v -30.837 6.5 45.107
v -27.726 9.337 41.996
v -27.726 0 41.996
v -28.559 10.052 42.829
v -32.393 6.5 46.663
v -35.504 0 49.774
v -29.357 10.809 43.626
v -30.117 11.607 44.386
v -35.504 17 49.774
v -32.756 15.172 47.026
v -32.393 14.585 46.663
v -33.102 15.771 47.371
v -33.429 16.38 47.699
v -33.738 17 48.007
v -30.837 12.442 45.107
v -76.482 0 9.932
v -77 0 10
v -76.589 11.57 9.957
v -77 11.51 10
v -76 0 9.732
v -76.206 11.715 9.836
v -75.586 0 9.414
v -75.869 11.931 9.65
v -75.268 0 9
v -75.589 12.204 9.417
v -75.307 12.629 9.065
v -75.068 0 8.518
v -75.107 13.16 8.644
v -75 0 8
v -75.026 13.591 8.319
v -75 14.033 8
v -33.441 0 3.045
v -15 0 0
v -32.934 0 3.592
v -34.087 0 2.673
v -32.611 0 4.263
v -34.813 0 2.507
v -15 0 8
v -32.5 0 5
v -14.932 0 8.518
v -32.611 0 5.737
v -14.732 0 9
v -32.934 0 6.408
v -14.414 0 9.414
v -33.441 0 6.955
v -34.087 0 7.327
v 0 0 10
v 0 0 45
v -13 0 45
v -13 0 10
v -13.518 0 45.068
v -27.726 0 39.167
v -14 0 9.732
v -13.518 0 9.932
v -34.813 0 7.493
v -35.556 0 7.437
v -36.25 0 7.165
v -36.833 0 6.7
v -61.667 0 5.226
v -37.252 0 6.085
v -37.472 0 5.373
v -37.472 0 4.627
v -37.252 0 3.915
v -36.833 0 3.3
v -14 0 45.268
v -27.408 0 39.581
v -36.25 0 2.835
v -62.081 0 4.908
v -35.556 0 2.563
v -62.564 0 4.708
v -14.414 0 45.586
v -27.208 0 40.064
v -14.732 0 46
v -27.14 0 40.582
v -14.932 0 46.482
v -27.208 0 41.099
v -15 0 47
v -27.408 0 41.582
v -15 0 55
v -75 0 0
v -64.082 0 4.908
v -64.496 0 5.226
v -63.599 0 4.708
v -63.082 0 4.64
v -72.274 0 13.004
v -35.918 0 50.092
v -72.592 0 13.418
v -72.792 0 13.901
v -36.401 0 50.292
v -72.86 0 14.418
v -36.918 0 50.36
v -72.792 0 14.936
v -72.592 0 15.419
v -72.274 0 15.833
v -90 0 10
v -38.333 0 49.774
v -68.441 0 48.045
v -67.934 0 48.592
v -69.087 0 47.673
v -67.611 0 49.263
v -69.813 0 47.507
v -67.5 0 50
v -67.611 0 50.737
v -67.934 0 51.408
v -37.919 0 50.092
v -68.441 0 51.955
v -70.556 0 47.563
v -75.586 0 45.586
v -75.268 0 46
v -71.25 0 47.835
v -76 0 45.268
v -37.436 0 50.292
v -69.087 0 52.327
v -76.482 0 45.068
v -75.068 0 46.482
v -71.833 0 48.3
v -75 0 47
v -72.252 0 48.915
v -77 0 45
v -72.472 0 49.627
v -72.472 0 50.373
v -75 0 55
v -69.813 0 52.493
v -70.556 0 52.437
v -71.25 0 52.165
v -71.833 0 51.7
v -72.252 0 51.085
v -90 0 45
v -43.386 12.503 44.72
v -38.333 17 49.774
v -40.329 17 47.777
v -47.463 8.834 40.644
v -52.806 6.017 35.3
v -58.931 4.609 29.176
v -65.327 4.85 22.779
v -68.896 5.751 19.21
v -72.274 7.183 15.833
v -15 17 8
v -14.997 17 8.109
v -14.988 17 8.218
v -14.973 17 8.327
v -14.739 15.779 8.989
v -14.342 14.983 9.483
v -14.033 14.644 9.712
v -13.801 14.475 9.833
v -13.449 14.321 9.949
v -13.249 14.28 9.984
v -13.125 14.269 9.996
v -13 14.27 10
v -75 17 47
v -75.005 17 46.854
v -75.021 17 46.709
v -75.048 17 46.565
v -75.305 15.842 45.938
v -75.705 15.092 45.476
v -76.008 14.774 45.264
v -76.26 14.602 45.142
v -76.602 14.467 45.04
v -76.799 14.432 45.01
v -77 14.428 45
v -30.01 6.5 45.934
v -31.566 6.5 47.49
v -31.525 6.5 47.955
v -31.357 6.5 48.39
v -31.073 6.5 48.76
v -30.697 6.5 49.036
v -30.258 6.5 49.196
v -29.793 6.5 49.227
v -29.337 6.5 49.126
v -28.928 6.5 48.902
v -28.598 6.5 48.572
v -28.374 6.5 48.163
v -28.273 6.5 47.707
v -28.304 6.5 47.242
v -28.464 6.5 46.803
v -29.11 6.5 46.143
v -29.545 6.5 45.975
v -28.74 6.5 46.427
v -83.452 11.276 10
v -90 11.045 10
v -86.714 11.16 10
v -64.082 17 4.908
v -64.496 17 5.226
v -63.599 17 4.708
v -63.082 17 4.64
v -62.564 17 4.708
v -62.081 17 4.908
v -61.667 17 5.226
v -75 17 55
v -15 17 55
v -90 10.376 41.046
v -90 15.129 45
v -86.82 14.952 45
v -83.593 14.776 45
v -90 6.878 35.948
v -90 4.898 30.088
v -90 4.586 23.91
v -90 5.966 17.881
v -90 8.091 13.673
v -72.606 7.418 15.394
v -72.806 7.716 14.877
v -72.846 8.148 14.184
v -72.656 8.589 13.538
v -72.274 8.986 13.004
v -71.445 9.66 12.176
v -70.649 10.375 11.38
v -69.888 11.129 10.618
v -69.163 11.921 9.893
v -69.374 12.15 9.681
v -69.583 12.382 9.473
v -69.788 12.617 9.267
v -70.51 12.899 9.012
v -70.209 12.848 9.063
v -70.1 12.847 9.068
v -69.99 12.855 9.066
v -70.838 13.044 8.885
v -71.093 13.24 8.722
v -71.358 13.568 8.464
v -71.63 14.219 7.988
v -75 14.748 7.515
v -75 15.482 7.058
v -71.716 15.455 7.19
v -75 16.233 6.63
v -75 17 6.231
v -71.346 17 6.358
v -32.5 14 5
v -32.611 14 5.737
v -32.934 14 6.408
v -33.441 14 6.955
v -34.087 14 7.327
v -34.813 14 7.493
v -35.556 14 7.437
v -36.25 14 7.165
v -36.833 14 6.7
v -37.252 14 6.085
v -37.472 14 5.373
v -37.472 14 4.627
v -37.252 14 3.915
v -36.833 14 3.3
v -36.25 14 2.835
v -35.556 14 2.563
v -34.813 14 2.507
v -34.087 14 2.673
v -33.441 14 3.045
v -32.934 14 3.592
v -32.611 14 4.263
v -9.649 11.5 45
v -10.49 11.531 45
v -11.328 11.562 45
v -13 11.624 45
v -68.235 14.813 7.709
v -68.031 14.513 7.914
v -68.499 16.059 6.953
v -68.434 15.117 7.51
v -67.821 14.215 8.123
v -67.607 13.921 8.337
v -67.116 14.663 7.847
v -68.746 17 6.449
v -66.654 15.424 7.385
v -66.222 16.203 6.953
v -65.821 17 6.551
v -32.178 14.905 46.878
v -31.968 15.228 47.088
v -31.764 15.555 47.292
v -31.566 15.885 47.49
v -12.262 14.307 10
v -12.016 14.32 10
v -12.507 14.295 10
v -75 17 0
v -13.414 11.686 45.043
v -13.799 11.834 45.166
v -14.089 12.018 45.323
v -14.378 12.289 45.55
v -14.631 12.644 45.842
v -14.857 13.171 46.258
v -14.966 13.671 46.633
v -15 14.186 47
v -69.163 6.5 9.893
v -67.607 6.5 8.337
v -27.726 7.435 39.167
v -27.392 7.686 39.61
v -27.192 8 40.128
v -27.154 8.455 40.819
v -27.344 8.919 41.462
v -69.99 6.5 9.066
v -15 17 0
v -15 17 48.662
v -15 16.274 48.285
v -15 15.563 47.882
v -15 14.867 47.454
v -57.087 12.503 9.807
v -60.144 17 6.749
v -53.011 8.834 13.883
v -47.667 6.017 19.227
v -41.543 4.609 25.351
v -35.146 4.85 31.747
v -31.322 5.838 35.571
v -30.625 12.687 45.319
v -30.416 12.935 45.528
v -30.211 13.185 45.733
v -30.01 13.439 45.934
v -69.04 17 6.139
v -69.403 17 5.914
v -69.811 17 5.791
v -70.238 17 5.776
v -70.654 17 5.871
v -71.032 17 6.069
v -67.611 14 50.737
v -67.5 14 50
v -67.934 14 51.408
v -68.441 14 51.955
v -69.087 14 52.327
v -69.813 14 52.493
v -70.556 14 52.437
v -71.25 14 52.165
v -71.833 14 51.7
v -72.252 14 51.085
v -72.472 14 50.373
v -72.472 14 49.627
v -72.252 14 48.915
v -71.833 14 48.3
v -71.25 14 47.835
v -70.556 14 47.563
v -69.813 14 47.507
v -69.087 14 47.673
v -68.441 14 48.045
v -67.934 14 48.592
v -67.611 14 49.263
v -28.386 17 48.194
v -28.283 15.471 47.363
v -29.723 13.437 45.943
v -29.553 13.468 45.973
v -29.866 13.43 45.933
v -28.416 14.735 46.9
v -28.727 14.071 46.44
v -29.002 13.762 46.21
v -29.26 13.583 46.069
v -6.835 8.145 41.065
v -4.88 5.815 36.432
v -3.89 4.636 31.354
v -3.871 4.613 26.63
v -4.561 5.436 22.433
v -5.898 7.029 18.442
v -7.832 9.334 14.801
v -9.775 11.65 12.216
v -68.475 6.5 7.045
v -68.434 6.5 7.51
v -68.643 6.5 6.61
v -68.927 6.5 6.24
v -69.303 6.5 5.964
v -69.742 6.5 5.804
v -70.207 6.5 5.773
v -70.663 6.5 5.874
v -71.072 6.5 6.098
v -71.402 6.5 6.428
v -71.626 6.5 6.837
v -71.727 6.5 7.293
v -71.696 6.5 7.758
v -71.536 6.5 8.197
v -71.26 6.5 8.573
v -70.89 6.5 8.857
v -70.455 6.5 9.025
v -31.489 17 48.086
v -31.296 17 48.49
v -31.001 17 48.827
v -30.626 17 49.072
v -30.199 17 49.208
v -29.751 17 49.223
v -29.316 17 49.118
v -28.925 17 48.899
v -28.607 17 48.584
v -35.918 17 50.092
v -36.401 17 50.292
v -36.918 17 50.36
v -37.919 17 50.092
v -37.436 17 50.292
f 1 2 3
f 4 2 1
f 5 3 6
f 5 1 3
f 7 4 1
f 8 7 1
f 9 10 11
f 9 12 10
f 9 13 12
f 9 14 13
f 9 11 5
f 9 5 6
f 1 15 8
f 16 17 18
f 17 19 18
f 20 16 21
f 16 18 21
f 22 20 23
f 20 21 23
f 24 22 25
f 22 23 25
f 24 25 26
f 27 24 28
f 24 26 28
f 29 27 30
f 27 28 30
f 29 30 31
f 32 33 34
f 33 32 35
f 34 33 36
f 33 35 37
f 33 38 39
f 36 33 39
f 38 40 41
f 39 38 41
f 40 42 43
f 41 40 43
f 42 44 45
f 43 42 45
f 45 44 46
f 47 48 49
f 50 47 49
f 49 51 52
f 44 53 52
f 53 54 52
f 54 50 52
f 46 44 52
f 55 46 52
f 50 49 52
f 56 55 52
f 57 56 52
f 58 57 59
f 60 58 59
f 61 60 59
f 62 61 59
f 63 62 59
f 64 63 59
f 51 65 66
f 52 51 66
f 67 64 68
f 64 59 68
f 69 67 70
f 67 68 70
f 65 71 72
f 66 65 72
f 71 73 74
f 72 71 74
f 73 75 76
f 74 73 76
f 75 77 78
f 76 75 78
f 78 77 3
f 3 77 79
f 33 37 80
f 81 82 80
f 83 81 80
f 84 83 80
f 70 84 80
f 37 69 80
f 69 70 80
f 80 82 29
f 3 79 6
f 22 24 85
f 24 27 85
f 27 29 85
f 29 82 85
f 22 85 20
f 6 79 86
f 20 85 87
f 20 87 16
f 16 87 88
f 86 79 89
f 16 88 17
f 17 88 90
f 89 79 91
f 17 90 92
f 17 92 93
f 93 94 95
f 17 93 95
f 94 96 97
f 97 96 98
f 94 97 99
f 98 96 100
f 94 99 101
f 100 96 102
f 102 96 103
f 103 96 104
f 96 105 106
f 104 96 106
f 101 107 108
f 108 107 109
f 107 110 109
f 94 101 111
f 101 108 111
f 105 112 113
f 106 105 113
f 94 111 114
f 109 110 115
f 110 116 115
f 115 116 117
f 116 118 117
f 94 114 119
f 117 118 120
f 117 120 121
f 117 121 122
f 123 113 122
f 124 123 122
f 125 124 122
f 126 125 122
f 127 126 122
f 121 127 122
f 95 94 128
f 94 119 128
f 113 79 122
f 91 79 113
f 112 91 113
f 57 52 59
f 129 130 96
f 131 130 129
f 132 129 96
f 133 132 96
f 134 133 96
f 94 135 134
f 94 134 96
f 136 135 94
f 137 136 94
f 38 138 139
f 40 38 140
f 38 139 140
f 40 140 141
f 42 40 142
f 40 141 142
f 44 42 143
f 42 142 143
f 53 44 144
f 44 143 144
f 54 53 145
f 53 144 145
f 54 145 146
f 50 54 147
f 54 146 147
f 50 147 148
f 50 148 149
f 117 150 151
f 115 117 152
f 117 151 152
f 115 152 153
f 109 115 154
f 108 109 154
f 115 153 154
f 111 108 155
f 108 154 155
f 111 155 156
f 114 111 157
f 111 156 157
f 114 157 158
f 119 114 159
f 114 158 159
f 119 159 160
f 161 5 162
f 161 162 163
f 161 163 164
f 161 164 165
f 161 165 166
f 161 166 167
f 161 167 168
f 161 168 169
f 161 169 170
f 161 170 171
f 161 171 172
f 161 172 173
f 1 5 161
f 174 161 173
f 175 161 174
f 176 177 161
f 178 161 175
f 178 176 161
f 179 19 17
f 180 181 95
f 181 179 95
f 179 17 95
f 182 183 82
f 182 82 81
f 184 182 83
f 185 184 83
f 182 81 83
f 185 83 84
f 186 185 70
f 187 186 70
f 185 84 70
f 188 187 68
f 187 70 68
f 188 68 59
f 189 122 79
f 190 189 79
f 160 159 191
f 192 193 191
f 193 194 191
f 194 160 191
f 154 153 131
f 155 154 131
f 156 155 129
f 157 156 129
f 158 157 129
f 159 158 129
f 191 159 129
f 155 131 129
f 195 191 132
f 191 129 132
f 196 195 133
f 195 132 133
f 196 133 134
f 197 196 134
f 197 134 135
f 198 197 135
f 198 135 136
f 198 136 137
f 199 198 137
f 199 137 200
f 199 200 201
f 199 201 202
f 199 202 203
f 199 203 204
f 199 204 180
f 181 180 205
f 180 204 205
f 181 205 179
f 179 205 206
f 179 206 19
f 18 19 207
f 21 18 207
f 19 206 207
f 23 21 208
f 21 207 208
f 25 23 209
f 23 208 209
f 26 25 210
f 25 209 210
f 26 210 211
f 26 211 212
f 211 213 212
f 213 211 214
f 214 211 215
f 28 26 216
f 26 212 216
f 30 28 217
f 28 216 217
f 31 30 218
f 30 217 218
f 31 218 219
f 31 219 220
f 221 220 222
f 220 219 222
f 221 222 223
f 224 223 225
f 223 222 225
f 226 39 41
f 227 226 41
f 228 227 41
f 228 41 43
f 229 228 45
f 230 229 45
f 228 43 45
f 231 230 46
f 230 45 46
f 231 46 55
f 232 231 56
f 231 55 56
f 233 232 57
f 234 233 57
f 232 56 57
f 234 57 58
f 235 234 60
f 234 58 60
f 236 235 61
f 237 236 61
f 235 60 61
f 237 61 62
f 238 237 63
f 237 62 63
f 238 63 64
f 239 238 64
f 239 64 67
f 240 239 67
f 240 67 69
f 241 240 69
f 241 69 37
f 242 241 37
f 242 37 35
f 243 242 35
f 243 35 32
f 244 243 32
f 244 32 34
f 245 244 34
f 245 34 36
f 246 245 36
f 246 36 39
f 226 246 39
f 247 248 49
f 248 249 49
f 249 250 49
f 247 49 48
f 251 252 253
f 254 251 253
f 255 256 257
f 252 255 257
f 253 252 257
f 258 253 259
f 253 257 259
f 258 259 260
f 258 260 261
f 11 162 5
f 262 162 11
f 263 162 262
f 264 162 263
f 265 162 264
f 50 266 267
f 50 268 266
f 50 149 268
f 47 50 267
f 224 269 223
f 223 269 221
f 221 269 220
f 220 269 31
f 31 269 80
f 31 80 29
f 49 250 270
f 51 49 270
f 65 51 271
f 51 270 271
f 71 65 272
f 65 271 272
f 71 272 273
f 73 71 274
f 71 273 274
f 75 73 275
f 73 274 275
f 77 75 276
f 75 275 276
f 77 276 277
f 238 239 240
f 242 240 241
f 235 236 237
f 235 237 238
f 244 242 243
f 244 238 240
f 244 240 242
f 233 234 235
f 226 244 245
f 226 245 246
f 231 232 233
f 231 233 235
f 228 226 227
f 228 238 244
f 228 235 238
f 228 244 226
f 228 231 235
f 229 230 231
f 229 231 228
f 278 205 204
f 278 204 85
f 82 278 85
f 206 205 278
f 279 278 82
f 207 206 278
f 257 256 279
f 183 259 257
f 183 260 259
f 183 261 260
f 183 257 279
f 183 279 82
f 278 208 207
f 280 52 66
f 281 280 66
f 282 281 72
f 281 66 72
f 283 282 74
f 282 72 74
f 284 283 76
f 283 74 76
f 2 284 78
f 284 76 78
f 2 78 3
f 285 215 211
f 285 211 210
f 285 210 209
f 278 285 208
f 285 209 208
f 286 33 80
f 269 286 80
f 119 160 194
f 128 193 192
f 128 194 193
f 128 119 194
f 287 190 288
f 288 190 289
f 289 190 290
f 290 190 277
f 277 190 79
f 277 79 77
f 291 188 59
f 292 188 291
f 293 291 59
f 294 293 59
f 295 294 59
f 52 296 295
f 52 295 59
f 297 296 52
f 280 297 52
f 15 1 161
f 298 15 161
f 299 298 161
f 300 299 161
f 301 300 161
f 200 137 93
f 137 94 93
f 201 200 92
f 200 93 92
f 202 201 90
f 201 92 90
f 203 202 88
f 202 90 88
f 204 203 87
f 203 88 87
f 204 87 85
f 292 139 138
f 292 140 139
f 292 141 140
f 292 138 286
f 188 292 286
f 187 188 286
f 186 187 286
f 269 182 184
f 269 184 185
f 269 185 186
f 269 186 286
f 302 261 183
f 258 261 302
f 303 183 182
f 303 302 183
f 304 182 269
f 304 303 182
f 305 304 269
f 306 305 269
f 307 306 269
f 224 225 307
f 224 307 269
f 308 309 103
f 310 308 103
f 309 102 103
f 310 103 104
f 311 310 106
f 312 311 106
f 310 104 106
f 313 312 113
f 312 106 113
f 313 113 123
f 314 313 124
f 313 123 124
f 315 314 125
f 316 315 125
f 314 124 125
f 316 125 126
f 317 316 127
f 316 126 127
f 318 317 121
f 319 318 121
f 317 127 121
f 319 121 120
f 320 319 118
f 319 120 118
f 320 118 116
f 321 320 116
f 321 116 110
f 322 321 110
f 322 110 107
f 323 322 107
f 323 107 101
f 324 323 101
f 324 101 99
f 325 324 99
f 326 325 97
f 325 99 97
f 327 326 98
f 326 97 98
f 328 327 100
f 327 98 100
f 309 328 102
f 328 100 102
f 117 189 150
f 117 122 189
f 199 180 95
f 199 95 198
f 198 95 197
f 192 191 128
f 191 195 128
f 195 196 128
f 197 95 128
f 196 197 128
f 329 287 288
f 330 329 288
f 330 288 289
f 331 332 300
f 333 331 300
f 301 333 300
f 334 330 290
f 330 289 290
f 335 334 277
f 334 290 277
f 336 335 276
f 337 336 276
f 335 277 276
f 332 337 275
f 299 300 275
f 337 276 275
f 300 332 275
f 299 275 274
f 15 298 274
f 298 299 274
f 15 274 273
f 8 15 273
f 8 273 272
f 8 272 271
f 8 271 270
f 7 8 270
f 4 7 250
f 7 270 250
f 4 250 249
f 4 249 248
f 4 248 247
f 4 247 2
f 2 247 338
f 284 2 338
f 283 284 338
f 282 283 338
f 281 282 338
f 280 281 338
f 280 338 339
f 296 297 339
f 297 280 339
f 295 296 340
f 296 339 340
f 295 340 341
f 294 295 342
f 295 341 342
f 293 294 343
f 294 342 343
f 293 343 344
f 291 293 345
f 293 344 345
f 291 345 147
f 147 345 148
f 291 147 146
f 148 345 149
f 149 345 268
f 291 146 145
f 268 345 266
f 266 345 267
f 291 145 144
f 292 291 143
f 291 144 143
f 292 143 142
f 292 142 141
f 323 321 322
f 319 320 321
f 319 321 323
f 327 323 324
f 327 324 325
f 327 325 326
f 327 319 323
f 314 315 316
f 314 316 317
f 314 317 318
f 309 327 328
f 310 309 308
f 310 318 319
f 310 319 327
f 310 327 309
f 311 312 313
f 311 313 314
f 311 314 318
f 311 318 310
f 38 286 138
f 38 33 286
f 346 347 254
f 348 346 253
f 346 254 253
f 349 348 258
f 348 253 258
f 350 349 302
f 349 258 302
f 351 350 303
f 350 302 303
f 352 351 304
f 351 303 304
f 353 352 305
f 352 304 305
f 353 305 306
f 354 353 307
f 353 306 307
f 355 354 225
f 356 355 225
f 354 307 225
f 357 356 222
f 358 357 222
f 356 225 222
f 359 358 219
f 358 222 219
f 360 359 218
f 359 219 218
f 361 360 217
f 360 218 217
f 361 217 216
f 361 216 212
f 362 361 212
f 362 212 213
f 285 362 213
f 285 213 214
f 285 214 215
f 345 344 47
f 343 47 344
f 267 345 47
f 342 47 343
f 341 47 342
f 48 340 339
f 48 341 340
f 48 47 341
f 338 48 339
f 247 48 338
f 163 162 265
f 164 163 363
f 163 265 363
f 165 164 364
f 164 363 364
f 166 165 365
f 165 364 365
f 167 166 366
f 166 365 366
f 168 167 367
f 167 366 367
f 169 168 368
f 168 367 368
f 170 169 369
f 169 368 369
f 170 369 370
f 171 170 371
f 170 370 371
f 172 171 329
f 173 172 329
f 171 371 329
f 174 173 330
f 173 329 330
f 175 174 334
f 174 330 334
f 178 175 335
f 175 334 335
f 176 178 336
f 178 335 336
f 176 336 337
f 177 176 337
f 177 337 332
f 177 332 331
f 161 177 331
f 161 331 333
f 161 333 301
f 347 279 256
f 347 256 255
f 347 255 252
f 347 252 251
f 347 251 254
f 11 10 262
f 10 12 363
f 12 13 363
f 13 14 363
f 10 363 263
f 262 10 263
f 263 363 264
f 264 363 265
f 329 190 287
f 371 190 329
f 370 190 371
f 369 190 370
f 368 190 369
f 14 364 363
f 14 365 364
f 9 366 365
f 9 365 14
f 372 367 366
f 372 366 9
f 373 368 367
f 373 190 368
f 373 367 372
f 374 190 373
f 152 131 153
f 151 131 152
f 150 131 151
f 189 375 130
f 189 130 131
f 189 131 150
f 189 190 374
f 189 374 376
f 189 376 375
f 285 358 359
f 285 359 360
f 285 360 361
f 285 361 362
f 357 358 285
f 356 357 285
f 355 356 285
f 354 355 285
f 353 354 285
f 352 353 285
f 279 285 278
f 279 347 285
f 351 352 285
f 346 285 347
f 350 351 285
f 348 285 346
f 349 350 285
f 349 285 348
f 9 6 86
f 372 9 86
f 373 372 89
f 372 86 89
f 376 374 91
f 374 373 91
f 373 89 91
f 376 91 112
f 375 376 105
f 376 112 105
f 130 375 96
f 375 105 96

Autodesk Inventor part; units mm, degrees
ref_plane "YZ Plane" through (0, 0, 0) normal (1, 0, 0) x (0, 1, 0)
ref_plane "XZ Plane" through (0, 0, 0) normal (0, 1, 0) x (-1, 0, 0)
sketch "Sketch24" plane through (0, 0, 0) normal (0, 1, 0) x (-1, 0, 0)
  line L0 (0, 0) -> (90, 0)
  line L1 (90, 0) -> (90, 55)
  line L2 (90, 55) -> (0, 55)
  line L3 (0, 55) -> (0, 0)
  dimension "d160" = 55
  dimension "d161" = 90
extrude "Extrusion21" add sketch "Sketch24" along normal blind 17
sketch "Sketch25" plane through (0, 0, 0) normal (0, -1, 0) x (1, 0, 0)
  circle A0 centre (-70, 50) radius 2.5
  circle A1 centre (-35, 5) radius 2.5
  line L0 (0, 0) -> (-90, 0) projected
  line L1 (-90, 55) -> (0, 55) projected
  line L2 (-90, 0) -> (-90, 55) projected
  dimension "d164" = 5
  dimension "d165" = 5
  dimension "d166" = 5
  dimension "d167" = 5
  dimension "d168" = 20
  dimension "d169" = 55
extrude "Extrusion22" cut sketch "Sketch25" against normal blind 14
sketch "Sketch26" plane through (0, 17, 0) normal (0, 1, 0) x (1, 0, 0)
  line L0 (-63.0815, -3.8119) -> (-26.3119, -40.5815)
  line L1 (-26.3119, -40.5815) -> (-36.9185, -51.1881)
  line L2 (-36.9185, -51.1881) -> (-73.6881, -14.4185)
  line L3 (-73.6881, -14.4185) -> (-63.0815, -3.8119)
  line L4 (-90, 0) -> (-90, -55) projected
  line L5 (0, 0) -> (-90, 0) projected
  point P0 (0, -22.5)
  dimension "d172" = 15
  dimension "d173" = 52
  dimension "d176" = 47.3762
  dimension "d177" = 47.3762
  dimension "d181" = 16.3119
  dimension "d182" = 45
  dimension "d183" = 3.8119
extrude "Extrusion23" cut sketch "Sketch26" against normal through all
ref_plane "Work Plane2" through (0, 0, 55) normal (0.9994, 0, 0.0349) x (0, 1, 0)
sketch "Sketch28" plane through (0, 0, 55) normal (0.9994, 0, 0.0349) x (0, 1, 0)
  circle A0 centre (27, -25.9665) radius 22.5
  line L0 (17, 0) -> (17, -54.9665) projected
  line L1 (0, -54.9665) -> (17, -54.9665) projected
  line L2 (0, 0) -> (0, -54.9665) projected
  dimension "d187" = 45
  dimension "d192" = 29
  dimension "d194" = 27
extrude "Extrusion24" cut sketch "Sketch28" against normal through all
sketch "Sketch29" plane through (0, 17, 0) normal (0, 1, 0) x (1, 0, 0)
  line L0 (-26.3119, -40.5815) -> (-63.0815, -3.8119) projected
  line L1 (-44.6967, -22.1967) -> (-55.3033, -32.8033)
  line L2 (-73.6881, -14.4185) -> (-40.3293, -47.7773) projected
  arc A0 (-68.4344, -7.51) -> (-69.99, -9.0656) centre (-70.0818, -7.4182) ccw
  line L3 (-63.5547, -12.3896) -> (-68.4344, -7.51)
  line L4 (-69.99, -9.0656) -> (-65.1104, -13.9453)
  line L5 (-65.1104, -13.9453) -> (-63.5547, -12.3896)
  line L6 (-65.8208, -6.5512) -> (-63.0815, -3.8119) projected
  arc A1 (-31.5656, -47.49) -> (-30.01, -45.9344) centre (-29.9182, -47.5818) ccw
  line L7 (-34.8896, -41.0547) -> (-30.01, -45.9344)
  line L8 (-31.5656, -47.49) -> (-36.4453, -42.6104)
  line L9 (-36.4453, -42.6104) -> (-34.8896, -41.0547)
  line L10 (-29.0512, -43.3208) -> (-26.3119, -40.5815)
  point P0 (0, 0)
  point P1 (-73.6881, -14.4185)
  point P2 (-56.553, -49.6596)
  point P3 (-21.3119, -14.4185)
  point P4 (-40.3293, -47.7773)
  point P5 (-36.9185, -51.1881)
  dimension "d216" = 2.2
  dimension "d217" = 1.1
  dimension "d218" = 3.3
  dimension "d219" = 2.4
  dimension "d221" = 7.5
  dimension "d222" = 15
extrude "Extrusion25" cut sketch "Sketch29" against normal blind 10.5
fillet "Fillet4" radius 2 4 edges at (-26.3119, 4.1375, 40.5815) (-63.0815, 8.5, 3.8119) (-73.6881, 3.9894, 14.4185) (-36.9185, 8.5, 51.1881)
sketch "Sketch31" plane through (0, 0, 0) normal (0, -1, 0) x (1, 0, 0)
  line L0 (7.4187, -6.4354) -> (-15, -6.4354)
  line L1 (-15, -6.4354) -> (-15, 10)
  line L2 (-15, 10) -> (7.4187, 10)
  line L3 (7.4187, 10) -> (7.4187, -6.4354)
  line L4 (0, 55) -> (0, 0) projected
  line L5 (0, 0) -> (-90, 0) projected
  line L6 (0, 0) -> (-90, 0) projected
  line L7 (-90, 55) -> (0, 55) projected
  line L8 (0, 27.5) -> (-90, 27.5)
  line L9 (-45, 62.4242) -> (-45, -8.4375)
  line L10 (-90, 0) -> (-90, 55) projected
  line L11 (7.4187, 61.4354) -> (-15, 61.4354)
  line L12 (-15, 61.4354) -> (-15, 45)
  line L13 (-15, 45) -> (7.4187, 45)
  line L14 (7.4187, 45) -> (7.4187, 61.4354)
  line L15 (-97.4187, -6.4354) -> (-75, -6.4354)
  line L16 (-75, -6.4354) -> (-75, 10)
  line L17 (-75, 10) -> (-97.4187, 10)
  line L18 (-97.4187, 10) -> (-97.4187, -6.4354)
  line L19 (-90, 55) -> (-90, 0)
  line L20 (-97.4187, 61.4354) -> (-75, 61.4354)
  line L21 (-75, 61.4354) -> (-75, 45)
  line L22 (-75, 45) -> (-97.4187, 45)
  line L23 (-97.4187, 45) -> (-97.4187, 61.4354)
  point P0 (-17, 0)
  point P1 (-17, 55)
  point P2 (-73, 0)
  point P3 (-73, 55)
  dimension "d227" = 15
  dimension "d228" = 10
  dimension "d229" = 45
  dimension "d230" = 90
extrude "Extrusion27" cut sketch "Sketch31" against normal through all contours L0 L1 L5 L4 L2 L3 | L1 L2 L4 L5 | L16 L15 L18 L17 L10 L5 | L5 L10 L17 L16 | L13 L12 L7 L4 | L4 L7 L12 L11 L14 L13 | L22 L23 L20 L21 L7 L10 | L10 L7 L21 L22
fillet "Fillet5" radius 2 4 edges at (-15, 7.0843, 10) (-75, 5.7918, 10) (-75, 7.1624, 45) (-15, 5.8494, 45)
sketch "Sketch32" plane through (0, 0, 45) normal (0, 0, 1) x (1, 0, 0)
  line L0 (0, 0) -> (-24.7878, 29.541)
  line L1 (-24.7878, 29.541) -> (8.6873, 22.432)
  line L2 (8.6873, 22.432) -> (0, 0)
  line L3 (0, 0) -> (-13, 0) projected
  dimension "d234" = 50
extrude "Extrusion28" cut sketch "Sketch32" against normal through all
properties part number "GuideCarotte" material "Nylon 6/6"
